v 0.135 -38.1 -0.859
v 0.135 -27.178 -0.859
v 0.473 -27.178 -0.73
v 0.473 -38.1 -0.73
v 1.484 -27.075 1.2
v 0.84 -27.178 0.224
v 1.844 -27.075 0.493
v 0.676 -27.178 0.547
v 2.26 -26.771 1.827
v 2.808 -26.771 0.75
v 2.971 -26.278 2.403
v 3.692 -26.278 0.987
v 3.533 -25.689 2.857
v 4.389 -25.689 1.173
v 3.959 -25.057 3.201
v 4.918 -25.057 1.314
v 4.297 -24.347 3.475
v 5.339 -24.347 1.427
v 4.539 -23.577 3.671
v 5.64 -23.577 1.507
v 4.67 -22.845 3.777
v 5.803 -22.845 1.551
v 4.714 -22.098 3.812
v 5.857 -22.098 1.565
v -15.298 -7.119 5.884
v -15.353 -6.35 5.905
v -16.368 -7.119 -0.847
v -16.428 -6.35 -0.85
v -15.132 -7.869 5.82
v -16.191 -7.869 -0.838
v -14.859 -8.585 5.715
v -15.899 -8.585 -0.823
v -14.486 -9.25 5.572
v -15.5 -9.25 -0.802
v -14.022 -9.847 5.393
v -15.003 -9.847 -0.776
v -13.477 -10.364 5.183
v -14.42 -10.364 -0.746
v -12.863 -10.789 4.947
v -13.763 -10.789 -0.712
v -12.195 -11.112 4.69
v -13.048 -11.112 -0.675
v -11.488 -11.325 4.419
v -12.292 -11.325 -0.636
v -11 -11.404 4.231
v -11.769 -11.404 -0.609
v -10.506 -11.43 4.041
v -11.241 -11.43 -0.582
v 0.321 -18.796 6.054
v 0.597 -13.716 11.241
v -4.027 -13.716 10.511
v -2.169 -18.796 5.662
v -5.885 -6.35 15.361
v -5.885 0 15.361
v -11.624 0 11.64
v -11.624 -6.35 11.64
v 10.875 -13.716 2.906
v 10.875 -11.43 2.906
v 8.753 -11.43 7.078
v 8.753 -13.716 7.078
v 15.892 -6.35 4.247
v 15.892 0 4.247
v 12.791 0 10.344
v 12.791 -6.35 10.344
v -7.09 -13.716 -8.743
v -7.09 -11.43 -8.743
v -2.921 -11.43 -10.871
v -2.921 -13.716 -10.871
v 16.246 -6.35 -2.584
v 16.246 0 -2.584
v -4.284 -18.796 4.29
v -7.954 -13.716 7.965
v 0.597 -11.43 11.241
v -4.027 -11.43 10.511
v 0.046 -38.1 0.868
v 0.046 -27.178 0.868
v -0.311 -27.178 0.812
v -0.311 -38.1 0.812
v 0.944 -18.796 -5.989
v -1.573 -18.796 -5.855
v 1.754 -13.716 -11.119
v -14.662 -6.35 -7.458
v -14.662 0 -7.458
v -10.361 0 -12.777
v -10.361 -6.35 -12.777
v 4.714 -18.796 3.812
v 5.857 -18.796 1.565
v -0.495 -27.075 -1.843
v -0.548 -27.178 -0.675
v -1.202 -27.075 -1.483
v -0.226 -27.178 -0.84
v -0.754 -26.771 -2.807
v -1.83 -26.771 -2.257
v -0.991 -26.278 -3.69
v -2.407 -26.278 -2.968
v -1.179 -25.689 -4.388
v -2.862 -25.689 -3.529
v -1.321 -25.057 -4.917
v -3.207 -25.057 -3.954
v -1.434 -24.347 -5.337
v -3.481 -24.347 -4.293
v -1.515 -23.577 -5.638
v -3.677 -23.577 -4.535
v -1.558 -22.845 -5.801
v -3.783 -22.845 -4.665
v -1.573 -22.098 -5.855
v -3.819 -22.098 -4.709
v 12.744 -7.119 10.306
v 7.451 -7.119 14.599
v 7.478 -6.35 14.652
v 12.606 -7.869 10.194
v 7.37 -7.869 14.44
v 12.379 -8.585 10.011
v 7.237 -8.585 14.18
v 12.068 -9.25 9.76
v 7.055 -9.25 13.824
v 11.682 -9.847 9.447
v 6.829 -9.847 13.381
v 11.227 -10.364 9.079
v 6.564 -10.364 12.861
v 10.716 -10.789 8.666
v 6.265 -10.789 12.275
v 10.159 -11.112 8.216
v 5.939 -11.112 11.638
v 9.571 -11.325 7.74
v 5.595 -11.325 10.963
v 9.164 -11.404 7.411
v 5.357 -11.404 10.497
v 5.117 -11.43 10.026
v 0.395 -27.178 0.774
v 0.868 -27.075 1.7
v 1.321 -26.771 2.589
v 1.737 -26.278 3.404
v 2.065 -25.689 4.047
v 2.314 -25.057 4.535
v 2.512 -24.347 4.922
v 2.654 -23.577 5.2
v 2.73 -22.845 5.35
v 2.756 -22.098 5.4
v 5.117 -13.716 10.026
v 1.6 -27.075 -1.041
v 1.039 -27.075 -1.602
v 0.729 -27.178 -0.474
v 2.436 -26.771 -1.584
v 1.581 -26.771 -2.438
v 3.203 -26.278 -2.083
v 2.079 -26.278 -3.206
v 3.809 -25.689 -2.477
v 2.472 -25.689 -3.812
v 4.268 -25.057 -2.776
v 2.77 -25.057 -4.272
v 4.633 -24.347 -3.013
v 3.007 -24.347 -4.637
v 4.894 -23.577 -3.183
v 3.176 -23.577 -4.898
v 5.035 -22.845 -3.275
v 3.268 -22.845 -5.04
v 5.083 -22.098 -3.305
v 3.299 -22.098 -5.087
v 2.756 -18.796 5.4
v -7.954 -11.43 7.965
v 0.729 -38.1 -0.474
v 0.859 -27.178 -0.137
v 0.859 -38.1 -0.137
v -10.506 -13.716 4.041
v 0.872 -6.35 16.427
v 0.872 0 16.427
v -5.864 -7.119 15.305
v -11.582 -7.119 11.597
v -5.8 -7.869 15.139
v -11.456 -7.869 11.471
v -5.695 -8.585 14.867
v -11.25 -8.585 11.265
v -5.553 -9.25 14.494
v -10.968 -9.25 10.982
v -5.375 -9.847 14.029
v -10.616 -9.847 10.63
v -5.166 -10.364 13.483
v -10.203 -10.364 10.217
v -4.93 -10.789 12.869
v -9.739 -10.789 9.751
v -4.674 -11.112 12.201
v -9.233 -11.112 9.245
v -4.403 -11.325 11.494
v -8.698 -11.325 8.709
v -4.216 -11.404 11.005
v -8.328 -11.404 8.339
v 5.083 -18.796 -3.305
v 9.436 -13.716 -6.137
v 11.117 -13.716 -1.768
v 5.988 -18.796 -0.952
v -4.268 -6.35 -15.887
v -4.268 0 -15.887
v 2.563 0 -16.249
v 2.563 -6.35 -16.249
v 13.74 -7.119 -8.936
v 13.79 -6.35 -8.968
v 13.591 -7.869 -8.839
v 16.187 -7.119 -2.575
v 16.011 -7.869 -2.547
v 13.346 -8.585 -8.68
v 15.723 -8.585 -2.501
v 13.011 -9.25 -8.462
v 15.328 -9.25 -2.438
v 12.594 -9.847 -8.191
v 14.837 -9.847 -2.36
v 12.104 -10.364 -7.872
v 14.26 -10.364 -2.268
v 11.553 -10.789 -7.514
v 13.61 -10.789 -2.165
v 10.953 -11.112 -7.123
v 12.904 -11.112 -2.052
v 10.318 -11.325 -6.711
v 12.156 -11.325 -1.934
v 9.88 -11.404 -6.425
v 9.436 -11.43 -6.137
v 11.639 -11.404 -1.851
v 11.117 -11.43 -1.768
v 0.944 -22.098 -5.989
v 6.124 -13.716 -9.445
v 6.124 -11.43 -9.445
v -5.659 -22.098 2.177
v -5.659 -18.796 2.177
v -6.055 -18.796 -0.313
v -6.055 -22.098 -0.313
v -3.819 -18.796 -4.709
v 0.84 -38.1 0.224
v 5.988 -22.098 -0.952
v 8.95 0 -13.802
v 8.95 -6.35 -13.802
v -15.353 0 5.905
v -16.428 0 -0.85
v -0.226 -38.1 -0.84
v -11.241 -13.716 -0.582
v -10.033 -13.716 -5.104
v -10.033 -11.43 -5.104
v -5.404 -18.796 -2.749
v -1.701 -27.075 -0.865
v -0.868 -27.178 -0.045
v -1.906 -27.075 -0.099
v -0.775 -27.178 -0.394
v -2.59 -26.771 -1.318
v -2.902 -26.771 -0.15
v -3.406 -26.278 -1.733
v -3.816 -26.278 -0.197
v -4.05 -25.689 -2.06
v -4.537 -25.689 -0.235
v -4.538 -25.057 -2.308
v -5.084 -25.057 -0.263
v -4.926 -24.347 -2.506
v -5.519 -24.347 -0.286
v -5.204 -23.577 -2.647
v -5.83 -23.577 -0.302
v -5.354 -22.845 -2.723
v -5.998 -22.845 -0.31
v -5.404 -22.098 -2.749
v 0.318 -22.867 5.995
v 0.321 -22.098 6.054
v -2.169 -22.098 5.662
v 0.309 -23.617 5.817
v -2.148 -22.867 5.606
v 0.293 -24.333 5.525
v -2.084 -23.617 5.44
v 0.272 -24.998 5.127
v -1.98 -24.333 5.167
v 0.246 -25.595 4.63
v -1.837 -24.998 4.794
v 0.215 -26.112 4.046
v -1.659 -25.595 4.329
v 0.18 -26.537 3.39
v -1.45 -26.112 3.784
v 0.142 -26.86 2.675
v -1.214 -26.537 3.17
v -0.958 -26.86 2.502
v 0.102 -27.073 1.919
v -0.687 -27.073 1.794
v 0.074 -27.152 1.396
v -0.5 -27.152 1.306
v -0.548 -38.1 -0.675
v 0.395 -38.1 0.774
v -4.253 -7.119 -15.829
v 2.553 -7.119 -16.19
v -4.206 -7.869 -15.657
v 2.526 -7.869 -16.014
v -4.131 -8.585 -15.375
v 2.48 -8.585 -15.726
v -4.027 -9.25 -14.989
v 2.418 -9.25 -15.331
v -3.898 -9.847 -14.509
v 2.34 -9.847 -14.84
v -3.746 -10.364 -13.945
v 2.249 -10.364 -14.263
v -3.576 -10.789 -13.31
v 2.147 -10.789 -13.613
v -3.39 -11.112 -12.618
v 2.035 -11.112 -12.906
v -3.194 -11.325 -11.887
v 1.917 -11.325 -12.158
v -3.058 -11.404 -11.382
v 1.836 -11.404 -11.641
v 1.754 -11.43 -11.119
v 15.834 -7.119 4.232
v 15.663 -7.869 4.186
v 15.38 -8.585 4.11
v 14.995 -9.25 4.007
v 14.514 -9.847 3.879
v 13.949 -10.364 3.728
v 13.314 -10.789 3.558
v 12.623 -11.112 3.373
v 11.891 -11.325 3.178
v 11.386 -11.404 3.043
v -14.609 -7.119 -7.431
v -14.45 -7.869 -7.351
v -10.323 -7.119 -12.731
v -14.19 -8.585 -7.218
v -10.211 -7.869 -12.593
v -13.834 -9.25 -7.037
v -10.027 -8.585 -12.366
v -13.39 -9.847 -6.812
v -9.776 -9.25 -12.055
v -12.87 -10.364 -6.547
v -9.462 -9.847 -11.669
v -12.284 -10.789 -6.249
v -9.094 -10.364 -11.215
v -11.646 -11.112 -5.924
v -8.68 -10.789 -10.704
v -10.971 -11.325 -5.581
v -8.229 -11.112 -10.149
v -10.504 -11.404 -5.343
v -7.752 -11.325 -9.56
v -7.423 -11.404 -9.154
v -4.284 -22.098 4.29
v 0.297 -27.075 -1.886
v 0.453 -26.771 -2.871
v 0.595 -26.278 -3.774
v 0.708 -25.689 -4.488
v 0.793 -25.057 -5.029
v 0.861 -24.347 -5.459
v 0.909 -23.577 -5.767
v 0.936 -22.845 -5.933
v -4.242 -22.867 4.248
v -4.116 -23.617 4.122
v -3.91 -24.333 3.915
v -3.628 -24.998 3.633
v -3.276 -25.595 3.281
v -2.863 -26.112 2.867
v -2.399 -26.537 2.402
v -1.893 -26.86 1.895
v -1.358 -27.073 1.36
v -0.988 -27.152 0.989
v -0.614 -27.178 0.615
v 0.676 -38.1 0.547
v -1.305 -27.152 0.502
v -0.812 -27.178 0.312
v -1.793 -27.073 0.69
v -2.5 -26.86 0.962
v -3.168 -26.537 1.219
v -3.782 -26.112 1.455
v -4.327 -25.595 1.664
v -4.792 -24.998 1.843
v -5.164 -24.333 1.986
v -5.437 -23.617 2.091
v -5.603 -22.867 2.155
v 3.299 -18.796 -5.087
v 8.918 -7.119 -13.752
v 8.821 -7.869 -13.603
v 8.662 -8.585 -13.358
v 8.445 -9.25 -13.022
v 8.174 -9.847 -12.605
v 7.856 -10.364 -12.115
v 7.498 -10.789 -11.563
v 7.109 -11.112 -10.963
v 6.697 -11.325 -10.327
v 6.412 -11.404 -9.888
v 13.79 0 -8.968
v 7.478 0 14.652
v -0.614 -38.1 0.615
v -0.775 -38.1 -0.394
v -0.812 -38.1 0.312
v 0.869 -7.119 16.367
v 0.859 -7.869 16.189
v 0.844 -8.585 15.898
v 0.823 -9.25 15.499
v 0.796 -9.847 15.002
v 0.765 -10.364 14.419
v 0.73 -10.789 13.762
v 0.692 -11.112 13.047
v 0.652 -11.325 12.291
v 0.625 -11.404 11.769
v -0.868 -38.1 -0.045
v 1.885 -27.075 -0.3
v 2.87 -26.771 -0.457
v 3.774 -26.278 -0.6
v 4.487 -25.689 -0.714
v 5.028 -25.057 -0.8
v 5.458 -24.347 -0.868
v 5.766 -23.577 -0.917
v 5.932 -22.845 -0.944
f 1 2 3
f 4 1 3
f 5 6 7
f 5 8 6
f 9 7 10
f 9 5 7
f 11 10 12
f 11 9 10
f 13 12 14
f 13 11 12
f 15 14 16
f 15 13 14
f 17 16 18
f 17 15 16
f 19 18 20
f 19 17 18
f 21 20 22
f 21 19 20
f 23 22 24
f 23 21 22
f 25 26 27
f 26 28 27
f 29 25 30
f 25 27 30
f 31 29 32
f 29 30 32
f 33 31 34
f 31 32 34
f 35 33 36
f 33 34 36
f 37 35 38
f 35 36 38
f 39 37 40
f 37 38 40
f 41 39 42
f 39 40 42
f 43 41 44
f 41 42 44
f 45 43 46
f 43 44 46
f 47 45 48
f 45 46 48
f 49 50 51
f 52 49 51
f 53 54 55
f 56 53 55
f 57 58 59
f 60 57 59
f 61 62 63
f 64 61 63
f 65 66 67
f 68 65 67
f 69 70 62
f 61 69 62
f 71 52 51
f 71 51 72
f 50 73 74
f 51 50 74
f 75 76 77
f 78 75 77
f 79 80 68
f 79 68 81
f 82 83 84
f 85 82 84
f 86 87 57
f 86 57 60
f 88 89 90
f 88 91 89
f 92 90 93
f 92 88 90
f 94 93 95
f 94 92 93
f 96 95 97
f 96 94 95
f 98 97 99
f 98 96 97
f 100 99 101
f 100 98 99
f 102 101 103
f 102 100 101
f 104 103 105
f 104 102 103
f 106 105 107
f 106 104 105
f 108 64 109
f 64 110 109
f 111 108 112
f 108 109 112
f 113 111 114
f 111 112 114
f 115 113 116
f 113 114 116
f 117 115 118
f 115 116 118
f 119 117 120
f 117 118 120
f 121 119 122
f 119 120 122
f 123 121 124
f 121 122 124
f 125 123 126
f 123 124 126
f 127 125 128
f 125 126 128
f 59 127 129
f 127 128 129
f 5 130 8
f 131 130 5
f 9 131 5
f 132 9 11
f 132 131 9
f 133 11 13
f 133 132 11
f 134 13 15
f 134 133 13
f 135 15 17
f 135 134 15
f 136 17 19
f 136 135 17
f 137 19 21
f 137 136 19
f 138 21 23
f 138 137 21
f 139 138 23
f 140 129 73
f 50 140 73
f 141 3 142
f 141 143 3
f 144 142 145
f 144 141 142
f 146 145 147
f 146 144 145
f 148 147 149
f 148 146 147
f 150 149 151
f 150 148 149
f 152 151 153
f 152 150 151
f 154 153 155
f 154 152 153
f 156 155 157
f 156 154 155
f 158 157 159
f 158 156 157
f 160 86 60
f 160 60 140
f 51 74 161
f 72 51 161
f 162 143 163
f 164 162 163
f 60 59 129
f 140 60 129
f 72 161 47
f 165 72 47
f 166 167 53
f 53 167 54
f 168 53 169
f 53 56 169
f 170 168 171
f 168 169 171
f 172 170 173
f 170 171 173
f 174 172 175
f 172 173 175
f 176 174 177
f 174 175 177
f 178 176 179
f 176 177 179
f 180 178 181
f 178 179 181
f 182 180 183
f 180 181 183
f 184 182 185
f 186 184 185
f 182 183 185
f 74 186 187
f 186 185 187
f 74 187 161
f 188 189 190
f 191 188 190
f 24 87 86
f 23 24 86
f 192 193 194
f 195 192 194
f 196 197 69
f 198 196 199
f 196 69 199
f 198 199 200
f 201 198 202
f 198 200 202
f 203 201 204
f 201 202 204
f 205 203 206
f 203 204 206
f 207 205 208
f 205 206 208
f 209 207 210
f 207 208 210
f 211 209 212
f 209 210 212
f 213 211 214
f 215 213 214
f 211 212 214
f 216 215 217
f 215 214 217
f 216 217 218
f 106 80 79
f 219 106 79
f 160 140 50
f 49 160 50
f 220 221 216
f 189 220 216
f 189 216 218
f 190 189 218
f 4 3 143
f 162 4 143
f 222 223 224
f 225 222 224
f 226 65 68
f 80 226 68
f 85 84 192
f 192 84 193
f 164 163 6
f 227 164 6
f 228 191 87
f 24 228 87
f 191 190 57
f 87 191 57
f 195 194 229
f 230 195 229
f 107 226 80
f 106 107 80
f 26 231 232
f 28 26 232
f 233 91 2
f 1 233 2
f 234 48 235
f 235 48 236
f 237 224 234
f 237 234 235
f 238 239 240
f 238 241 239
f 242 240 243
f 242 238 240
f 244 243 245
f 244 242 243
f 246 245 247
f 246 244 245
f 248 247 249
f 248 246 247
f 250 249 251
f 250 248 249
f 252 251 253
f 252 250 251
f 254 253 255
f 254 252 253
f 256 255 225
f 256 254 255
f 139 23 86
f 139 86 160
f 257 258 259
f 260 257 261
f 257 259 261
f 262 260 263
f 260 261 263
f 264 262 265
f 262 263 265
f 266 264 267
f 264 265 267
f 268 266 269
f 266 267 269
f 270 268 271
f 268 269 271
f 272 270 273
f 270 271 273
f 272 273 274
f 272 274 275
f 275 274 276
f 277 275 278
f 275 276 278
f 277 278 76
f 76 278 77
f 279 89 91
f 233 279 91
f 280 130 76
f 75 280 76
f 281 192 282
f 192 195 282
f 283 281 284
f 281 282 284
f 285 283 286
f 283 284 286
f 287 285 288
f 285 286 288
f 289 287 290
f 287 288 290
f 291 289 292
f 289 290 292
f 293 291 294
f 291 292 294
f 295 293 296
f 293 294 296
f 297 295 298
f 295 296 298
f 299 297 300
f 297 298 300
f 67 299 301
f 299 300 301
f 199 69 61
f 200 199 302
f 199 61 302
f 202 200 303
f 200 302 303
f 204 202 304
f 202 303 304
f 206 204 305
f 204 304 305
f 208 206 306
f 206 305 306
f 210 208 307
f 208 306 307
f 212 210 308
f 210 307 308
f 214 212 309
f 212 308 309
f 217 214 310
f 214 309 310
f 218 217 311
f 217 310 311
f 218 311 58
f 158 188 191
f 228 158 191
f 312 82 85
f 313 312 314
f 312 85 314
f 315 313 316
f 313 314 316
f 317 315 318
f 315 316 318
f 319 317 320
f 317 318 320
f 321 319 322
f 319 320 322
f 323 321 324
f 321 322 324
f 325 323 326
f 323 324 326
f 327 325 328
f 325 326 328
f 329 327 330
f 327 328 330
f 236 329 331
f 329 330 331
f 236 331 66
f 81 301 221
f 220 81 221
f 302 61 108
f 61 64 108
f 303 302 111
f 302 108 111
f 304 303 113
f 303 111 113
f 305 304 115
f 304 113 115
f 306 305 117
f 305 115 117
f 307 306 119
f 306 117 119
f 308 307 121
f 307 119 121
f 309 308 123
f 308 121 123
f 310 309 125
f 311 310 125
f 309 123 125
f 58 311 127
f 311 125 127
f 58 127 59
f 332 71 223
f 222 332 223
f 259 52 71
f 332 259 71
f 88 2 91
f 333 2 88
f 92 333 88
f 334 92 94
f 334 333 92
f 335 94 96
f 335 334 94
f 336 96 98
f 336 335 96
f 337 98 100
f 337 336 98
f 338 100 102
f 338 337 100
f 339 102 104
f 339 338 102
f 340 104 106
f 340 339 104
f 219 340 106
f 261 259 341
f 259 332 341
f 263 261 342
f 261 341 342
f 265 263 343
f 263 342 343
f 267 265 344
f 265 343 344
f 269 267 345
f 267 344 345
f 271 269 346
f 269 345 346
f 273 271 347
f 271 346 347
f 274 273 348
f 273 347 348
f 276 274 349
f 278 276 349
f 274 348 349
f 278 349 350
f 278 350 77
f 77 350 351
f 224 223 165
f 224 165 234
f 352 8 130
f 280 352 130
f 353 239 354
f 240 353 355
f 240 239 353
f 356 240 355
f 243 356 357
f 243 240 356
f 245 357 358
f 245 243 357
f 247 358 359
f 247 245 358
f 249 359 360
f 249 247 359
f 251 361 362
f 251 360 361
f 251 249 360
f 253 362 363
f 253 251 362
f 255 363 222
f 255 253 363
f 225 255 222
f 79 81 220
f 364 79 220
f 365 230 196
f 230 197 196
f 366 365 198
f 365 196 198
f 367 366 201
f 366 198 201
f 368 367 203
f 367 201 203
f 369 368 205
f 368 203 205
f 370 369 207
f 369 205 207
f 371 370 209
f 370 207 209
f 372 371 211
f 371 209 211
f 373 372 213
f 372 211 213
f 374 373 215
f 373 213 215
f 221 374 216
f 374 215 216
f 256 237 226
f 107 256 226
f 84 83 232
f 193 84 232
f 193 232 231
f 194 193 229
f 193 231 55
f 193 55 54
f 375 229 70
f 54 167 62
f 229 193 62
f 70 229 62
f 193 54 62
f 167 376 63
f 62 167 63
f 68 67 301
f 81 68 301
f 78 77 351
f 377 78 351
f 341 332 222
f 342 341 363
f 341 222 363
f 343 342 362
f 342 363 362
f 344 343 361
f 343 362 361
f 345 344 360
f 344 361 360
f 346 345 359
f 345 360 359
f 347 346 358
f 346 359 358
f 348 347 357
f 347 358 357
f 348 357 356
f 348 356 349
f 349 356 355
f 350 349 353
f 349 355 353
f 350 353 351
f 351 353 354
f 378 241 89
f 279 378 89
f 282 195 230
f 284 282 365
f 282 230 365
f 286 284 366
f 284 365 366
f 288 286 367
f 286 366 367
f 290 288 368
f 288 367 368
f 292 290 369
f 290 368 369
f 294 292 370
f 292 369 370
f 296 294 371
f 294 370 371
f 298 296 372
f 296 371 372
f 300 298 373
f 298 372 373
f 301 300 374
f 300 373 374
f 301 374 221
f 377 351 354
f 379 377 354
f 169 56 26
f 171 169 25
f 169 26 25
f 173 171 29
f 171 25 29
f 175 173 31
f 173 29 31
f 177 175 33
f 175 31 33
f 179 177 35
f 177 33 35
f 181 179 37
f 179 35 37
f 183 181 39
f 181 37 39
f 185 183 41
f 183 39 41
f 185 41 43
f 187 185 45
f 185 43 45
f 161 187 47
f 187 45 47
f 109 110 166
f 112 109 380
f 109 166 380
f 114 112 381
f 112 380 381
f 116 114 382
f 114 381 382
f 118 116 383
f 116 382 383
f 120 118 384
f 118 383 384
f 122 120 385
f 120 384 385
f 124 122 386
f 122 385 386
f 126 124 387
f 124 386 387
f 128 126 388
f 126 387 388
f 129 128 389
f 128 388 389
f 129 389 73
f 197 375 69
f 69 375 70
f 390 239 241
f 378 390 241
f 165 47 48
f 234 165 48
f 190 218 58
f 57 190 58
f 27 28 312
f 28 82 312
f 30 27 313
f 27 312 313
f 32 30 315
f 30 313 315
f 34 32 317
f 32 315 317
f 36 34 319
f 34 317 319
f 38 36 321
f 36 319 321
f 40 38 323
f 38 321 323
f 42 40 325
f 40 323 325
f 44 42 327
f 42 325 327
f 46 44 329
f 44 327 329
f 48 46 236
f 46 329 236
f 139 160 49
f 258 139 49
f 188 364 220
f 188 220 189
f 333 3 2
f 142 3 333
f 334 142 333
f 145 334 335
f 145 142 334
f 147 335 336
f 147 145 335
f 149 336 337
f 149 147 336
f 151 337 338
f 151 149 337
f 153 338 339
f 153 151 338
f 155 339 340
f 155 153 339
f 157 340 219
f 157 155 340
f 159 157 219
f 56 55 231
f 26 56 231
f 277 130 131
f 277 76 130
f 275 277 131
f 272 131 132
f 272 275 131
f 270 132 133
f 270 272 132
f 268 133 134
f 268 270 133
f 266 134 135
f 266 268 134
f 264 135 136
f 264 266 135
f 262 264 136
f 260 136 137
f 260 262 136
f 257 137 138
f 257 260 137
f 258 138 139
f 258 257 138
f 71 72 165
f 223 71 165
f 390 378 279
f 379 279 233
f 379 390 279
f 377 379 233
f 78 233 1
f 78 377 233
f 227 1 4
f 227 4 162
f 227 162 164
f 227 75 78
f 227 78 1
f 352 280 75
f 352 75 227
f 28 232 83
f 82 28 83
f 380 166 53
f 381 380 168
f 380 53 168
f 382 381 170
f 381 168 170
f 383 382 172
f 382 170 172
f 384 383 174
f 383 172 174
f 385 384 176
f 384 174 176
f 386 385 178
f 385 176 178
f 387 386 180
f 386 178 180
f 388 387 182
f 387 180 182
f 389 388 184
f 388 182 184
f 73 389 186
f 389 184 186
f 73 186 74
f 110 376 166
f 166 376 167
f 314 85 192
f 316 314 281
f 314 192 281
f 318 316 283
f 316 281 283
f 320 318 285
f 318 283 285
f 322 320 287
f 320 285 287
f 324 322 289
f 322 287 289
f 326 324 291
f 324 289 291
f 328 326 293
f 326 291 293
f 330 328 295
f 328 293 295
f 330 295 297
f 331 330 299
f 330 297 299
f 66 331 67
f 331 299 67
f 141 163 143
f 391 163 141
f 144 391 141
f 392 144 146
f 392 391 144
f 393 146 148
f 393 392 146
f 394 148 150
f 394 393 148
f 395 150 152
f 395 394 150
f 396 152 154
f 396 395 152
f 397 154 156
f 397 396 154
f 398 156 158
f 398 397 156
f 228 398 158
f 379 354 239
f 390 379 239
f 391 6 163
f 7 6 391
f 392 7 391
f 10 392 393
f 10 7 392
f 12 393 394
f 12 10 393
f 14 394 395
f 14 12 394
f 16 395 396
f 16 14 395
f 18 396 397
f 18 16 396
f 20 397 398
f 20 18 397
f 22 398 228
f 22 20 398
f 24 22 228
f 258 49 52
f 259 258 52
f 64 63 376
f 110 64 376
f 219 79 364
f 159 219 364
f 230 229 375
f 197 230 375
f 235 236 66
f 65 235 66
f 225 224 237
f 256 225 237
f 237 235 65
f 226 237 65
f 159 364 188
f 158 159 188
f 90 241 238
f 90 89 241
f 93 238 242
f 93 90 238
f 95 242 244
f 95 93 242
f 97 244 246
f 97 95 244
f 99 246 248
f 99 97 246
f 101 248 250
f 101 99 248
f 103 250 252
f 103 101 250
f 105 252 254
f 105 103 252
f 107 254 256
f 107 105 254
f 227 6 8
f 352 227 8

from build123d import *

# Parameters (mm, degrees)
F1_DEPTH = 11.43
F2_R     = 5.08
F3_DEPTH = 2.286
F4_DEPTH = 5.08
F5_SIZE  = 5.08
F6_DEPTH = 8.382
F7_R     = 5.08
F8_DEPTH = 10.922


with BuildPart() as f1:
    # F0 (on Front) → F1 (new body)
    with BuildSketch(Plane.XZ):
        Polygon((-5.8849686034, 15.3612454542), (-11.6241677455, 11.6395636341), (-15.3534426822, 5.9052955195), (-16.4279678975, -0.8500518383), (-14.6619482199, -7.4584175109), (-10.3607444954, -12.7771550382), (-4.2680739233, -15.8866063825), (2.5625854044, -16.2491191581), (8.9501504353, -13.8020116126), (13.7901531464, -8.968410872), (16.2457130989, -2.5840904161), (15.8922416689, 4.2470427484), (12.7908572779, 10.3438236386), (7.4778174622, 14.652063451), (0.8717950735, 16.4268283828), align=None)
    extrude(amount=F1_DEPTH)

    # F2
    f2_edges = [f1.edges().sort_by_distance(p)[0] for p in [
        (-2.506587, -11.43, 15.894037),
        (-8.754568, -11.43, 13.500405),
        (-13.488805, -11.43, 8.77243),
        (-15.890705, -11.43, 2.527622),
        (-15.544958, -11.43, -4.154235),
        (-12.511346, -11.43, -10.117786),
        (-7.314409, -11.43, -14.331881),
        (-0.852744, -11.43, -16.067863),
        (5.756368, -11.43, -15.025565),
        (11.370152, -11.43, -11.385211),
        (15.017933, -11.43, -5.776251),
        (16.068977, -11.43, 0.831476),
        (14.341549, -11.43, 7.295433),
        (10.134337, -11.43, 12.497944),
        (4.174806, -11.43, 15.539446),
    ]]
    fillet(f2_edges, radius=F2_R)

    # F3 (add): a face of the model
    f3_faces = [f1.faces().sort_by_distance(p)[0] for p in [
        (0, -11.43, 0),
    ]]
    extrude(f3_faces, amount=F3_DEPTH)

    # F4 (add): a face of the model
    f4_faces = [f1.faces().sort_by_distance(p)[0] for p in [
        (0, -13.716, 0),
    ]]
    extrude(f4_faces, amount=F4_DEPTH)

    # F5
    f5_edges = [f1.edges().sort_by_distance(p)[0] for p in [
        (-5.990622, -18.796, 9.238128),
        (-1.71522, -18.796, 10.876055),
        (2.856758, -18.796, 10.633414),
        (6.934778, -18.796, 8.552159),
        (9.813711, -18.796, 4.992157),
        (10.995765, -18.796, 0.568967),
        (10.27655, -18.796, -3.952603),
        (7.780427, -18.796, -7.790732),
        (3.938998, -18.796, -10.281773),
        (-0.58352, -18.796, -10.995002),
        (-5.005142, -18.796, -9.807095),
        (-8.56133, -18.796, -6.923452),
        (-10.637186, -18.796, -2.842682),
        (-10.873776, -18.796, 1.729614),
        (-9.230191, -18.796, 6.002844),
    ]]
    chamfer(f5_edges, length=F5_SIZE)

    # F6 (add): a face of the model
    f6_faces = [f1.faces().sort_by_distance(p)[0] for p in [
        (0, -18.796, 0),
    ]]
    extrude(f6_faces, amount=F6_DEPTH)

    # F7
    f7_edges = [f1.edges().sort_by_distance(p)[0] for p in [
        (-3.226676, -27.178, 4.975851),
        (-0.923854, -27.178, 5.858074),
        (-4.971576, -27.178, 3.233259),
        (1.538711, -27.178, 5.727382),
        (-5.856846, -27.178, 0.931607),
        (3.735218, -27.178, 4.606374),
        (-5.729414, -27.178, -1.531129),
        (5.285873, -27.178, 2.688882),
        (-4.611314, -27.178, -3.729118),
        (5.922552, -27.178, 0.306458),
        (-2.695876, -27.178, -5.282309),
        (5.535168, -27.178, -2.128956),
        (-0.314296, -27.178, -5.922141),
        (4.190703, -27.178, -4.196253),
        (2.121628, -27.178, -5.537981),
    ]]
    fillet(f7_edges, radius=F7_R)

    # F8 (add): a face of the model
    f8_faces = [f1.faces().sort_by_distance(p)[0] for p in [
        (0, -27.178, 0),
    ]]
    extrude(f8_faces, amount=F8_DEPTH)


solid = f1.part
